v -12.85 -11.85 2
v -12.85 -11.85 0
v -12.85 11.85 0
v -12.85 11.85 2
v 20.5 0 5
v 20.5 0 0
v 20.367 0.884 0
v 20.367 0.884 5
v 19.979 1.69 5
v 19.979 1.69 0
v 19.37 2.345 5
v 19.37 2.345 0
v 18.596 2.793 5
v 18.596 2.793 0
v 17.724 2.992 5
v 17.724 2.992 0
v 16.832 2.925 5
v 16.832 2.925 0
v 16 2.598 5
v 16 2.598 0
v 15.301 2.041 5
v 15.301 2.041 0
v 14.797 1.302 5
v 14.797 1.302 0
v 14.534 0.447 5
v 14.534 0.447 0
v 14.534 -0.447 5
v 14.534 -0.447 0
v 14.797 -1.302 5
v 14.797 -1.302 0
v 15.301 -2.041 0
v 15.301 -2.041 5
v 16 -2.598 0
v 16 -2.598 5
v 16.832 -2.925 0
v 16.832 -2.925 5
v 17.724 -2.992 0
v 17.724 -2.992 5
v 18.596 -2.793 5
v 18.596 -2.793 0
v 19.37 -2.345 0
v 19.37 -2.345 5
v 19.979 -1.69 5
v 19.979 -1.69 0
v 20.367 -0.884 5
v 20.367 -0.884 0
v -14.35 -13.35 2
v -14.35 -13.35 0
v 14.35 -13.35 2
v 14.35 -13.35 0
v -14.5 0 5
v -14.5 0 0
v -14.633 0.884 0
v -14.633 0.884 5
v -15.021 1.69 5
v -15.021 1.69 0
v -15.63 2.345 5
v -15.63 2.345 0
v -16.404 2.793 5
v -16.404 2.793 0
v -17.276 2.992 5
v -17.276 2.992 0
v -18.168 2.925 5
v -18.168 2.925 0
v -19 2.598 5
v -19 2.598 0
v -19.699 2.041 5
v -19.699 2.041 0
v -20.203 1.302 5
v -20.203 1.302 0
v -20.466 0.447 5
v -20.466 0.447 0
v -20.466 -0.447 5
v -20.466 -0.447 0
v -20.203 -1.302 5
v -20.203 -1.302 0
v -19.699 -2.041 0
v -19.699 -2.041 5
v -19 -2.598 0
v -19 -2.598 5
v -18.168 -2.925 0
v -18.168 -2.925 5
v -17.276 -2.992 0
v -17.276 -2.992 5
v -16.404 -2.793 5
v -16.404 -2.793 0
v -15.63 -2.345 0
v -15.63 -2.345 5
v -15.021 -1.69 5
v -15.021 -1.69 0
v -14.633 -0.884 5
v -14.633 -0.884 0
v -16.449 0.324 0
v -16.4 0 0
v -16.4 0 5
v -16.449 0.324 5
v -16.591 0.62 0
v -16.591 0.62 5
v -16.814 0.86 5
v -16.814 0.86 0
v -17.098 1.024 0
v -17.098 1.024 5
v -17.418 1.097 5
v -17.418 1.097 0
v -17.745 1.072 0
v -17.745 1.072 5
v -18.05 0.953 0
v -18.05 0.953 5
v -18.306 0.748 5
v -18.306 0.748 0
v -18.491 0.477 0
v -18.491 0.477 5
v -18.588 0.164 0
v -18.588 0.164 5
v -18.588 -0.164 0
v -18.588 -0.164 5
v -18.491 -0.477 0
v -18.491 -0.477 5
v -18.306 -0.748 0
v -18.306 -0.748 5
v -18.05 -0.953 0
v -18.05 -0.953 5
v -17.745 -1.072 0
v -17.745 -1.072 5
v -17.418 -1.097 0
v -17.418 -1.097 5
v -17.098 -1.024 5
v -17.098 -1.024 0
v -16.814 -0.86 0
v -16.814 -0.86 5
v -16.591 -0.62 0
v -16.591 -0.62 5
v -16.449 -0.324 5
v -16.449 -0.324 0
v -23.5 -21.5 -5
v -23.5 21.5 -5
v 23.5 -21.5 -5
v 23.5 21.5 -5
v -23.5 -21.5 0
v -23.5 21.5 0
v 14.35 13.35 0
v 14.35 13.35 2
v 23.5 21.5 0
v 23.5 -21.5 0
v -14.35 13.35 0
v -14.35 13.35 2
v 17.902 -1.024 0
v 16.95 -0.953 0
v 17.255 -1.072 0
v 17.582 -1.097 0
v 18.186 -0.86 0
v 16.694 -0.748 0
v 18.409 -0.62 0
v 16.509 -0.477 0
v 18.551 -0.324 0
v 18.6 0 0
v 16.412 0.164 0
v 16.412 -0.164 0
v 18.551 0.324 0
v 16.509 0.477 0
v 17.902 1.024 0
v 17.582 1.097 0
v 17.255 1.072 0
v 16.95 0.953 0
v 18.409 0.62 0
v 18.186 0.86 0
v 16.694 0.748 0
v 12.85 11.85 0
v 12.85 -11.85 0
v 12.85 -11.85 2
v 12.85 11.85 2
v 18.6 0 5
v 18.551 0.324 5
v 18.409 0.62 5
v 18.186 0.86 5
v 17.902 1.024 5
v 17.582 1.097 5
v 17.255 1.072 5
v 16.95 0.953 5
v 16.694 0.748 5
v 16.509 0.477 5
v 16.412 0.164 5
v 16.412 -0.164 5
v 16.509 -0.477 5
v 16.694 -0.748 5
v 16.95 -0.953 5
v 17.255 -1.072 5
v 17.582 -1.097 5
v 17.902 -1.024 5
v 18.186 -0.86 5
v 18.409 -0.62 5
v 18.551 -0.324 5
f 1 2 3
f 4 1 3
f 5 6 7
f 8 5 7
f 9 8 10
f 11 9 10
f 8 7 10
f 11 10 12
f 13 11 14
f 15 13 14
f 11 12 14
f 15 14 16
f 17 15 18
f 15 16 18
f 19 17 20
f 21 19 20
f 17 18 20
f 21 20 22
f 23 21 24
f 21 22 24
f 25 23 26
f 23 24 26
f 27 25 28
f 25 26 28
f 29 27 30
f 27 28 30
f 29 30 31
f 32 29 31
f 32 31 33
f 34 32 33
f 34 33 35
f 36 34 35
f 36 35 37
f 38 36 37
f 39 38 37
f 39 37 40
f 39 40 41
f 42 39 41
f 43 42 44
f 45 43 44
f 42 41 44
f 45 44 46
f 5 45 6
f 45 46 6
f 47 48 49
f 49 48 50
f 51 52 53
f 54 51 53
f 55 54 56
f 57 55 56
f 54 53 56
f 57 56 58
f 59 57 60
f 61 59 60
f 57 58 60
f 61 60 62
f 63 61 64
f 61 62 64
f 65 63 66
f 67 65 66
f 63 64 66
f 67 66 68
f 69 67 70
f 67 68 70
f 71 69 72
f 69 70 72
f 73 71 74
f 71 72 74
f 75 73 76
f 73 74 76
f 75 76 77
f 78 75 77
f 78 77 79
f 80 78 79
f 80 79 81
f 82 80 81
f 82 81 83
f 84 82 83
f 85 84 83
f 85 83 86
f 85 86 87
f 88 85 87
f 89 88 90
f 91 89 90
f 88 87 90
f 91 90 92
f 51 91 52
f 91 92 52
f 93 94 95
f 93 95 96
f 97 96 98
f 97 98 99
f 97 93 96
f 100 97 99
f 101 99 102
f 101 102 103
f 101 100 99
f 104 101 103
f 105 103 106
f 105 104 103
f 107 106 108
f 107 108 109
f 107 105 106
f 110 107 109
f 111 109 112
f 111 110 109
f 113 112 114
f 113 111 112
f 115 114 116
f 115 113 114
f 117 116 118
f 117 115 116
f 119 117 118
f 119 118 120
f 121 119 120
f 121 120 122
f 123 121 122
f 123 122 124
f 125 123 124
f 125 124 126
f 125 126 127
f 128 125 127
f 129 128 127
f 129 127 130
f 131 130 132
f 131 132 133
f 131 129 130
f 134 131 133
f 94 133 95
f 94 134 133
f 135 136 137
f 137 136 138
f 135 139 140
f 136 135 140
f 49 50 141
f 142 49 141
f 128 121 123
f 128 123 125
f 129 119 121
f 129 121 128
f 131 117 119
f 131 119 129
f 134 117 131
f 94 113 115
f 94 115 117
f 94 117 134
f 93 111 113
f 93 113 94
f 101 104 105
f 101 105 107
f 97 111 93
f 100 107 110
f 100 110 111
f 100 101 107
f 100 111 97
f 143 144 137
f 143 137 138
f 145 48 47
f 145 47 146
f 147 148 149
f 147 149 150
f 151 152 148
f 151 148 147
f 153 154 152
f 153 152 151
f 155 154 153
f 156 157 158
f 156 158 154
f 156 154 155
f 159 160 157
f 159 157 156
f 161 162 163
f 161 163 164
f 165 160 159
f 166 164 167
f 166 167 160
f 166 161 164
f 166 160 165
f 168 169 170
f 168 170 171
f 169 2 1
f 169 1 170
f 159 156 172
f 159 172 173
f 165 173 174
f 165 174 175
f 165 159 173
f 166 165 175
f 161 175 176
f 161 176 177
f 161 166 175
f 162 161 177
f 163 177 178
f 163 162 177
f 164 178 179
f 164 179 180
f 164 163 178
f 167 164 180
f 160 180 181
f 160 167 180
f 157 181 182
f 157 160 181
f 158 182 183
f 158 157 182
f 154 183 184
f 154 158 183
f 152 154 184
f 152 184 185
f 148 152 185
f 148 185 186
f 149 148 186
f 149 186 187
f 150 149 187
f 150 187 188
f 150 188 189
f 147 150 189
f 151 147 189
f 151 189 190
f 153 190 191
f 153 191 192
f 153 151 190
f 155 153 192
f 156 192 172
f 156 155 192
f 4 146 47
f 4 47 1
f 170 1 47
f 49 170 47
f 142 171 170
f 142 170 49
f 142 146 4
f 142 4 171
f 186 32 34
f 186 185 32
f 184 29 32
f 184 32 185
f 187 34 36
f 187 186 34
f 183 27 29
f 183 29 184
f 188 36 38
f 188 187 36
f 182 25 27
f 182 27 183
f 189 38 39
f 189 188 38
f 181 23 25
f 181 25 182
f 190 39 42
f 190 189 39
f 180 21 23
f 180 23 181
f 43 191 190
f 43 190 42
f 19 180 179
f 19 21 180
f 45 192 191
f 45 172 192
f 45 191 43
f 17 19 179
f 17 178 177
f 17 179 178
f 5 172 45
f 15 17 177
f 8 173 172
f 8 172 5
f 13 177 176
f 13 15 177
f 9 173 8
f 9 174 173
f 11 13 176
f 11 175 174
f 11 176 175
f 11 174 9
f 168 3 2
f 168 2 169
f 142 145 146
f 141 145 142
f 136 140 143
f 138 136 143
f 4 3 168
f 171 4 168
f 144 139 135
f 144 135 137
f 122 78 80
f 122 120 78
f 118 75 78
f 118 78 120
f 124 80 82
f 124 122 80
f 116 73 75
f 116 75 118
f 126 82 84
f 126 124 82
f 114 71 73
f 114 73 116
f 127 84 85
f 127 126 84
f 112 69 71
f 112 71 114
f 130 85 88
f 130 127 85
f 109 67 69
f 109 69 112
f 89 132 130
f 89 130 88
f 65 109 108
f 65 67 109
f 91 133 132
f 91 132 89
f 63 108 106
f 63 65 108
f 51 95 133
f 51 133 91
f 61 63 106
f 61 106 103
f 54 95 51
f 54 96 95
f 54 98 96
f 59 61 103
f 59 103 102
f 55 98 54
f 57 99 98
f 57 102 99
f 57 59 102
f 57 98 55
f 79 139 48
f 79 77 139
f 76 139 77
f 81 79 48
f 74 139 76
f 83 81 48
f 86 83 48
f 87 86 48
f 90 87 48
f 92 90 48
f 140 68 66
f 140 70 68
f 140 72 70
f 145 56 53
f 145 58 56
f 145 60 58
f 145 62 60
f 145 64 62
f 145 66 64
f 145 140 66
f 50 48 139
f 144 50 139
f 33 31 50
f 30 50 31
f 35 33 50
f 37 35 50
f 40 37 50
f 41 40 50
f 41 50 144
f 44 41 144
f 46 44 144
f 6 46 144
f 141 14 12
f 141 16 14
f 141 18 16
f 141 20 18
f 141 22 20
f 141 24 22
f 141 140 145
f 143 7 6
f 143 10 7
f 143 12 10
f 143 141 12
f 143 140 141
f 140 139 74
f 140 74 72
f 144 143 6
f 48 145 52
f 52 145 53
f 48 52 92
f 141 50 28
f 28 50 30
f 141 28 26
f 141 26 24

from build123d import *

# Parameters (mm, degrees)
SKETCH_1_W        = 28.7
SKETCH_1_H        = 26.7
SKETCH_1_W_2      = 25.7
SKETCH_1_H_2      = 23.7
EXTRUDE_2_DEPTH   = 2
SKETCH_1_7_R      = 3
SKETCH_1_7_R_2    = 1.1
EXTRUDE_5_DEPTH   = 5
EXTRUDE_5_2_DEPTH = 5
SKETCH_1_8_W      = 47
SKETCH_1_8_H      = 43
EXTRUDE_6_DEPTH   = 5


with BuildPart() as part:
    # 草图1 → 凸台-拉伸2 (new body)
    with BuildSketch(Plane.XY):
        Rectangle(SKETCH_1_W, SKETCH_1_H)
        Rectangle(SKETCH_1_W_2, SKETCH_1_H_2, mode=Mode.SUBTRACT)
    extrude(amount=EXTRUDE_2_DEPTH)



with BuildPart() as body_2:
    # 草图1<7> → 凸台-拉伸5 (new body)
    with BuildSketch(Plane.XY):
        with Locations((17.5, 0)):
            Circle(SKETCH_1_7_R)
        with Locations((17.5, 0)):
            Circle(SKETCH_1_7_R_2, mode=Mode.SUBTRACT)
    extrude(amount=EXTRUDE_5_DEPTH)


with BuildPart() as body_3:
    # 草图1<7> → Extrude 5 2 (new body)
    with BuildSketch(Plane.XY):
        with Locations((-17.5, 0)):
            Circle(SKETCH_1_7_R)
        with Locations((-17.5, 0)):
            Circle(SKETCH_1_7_R_2, mode=Mode.SUBTRACT)
    extrude(amount=EXTRUDE_5_2_DEPTH)


with BuildPart() as part_1:
    add(part.part)

    add(body_2.part)  # 凸台-拉伸6 merges body 2

    add(body_3.part)  # 凸台-拉伸6 merges body 3
    # 草图1<8> → 凸台-拉伸6 (add)
    with BuildSketch(Plane.XY):
        Rectangle(SKETCH_1_8_W, SKETCH_1_8_H)
    extrude(amount=-EXTRUDE_6_DEPTH)


solid = part_1.part
